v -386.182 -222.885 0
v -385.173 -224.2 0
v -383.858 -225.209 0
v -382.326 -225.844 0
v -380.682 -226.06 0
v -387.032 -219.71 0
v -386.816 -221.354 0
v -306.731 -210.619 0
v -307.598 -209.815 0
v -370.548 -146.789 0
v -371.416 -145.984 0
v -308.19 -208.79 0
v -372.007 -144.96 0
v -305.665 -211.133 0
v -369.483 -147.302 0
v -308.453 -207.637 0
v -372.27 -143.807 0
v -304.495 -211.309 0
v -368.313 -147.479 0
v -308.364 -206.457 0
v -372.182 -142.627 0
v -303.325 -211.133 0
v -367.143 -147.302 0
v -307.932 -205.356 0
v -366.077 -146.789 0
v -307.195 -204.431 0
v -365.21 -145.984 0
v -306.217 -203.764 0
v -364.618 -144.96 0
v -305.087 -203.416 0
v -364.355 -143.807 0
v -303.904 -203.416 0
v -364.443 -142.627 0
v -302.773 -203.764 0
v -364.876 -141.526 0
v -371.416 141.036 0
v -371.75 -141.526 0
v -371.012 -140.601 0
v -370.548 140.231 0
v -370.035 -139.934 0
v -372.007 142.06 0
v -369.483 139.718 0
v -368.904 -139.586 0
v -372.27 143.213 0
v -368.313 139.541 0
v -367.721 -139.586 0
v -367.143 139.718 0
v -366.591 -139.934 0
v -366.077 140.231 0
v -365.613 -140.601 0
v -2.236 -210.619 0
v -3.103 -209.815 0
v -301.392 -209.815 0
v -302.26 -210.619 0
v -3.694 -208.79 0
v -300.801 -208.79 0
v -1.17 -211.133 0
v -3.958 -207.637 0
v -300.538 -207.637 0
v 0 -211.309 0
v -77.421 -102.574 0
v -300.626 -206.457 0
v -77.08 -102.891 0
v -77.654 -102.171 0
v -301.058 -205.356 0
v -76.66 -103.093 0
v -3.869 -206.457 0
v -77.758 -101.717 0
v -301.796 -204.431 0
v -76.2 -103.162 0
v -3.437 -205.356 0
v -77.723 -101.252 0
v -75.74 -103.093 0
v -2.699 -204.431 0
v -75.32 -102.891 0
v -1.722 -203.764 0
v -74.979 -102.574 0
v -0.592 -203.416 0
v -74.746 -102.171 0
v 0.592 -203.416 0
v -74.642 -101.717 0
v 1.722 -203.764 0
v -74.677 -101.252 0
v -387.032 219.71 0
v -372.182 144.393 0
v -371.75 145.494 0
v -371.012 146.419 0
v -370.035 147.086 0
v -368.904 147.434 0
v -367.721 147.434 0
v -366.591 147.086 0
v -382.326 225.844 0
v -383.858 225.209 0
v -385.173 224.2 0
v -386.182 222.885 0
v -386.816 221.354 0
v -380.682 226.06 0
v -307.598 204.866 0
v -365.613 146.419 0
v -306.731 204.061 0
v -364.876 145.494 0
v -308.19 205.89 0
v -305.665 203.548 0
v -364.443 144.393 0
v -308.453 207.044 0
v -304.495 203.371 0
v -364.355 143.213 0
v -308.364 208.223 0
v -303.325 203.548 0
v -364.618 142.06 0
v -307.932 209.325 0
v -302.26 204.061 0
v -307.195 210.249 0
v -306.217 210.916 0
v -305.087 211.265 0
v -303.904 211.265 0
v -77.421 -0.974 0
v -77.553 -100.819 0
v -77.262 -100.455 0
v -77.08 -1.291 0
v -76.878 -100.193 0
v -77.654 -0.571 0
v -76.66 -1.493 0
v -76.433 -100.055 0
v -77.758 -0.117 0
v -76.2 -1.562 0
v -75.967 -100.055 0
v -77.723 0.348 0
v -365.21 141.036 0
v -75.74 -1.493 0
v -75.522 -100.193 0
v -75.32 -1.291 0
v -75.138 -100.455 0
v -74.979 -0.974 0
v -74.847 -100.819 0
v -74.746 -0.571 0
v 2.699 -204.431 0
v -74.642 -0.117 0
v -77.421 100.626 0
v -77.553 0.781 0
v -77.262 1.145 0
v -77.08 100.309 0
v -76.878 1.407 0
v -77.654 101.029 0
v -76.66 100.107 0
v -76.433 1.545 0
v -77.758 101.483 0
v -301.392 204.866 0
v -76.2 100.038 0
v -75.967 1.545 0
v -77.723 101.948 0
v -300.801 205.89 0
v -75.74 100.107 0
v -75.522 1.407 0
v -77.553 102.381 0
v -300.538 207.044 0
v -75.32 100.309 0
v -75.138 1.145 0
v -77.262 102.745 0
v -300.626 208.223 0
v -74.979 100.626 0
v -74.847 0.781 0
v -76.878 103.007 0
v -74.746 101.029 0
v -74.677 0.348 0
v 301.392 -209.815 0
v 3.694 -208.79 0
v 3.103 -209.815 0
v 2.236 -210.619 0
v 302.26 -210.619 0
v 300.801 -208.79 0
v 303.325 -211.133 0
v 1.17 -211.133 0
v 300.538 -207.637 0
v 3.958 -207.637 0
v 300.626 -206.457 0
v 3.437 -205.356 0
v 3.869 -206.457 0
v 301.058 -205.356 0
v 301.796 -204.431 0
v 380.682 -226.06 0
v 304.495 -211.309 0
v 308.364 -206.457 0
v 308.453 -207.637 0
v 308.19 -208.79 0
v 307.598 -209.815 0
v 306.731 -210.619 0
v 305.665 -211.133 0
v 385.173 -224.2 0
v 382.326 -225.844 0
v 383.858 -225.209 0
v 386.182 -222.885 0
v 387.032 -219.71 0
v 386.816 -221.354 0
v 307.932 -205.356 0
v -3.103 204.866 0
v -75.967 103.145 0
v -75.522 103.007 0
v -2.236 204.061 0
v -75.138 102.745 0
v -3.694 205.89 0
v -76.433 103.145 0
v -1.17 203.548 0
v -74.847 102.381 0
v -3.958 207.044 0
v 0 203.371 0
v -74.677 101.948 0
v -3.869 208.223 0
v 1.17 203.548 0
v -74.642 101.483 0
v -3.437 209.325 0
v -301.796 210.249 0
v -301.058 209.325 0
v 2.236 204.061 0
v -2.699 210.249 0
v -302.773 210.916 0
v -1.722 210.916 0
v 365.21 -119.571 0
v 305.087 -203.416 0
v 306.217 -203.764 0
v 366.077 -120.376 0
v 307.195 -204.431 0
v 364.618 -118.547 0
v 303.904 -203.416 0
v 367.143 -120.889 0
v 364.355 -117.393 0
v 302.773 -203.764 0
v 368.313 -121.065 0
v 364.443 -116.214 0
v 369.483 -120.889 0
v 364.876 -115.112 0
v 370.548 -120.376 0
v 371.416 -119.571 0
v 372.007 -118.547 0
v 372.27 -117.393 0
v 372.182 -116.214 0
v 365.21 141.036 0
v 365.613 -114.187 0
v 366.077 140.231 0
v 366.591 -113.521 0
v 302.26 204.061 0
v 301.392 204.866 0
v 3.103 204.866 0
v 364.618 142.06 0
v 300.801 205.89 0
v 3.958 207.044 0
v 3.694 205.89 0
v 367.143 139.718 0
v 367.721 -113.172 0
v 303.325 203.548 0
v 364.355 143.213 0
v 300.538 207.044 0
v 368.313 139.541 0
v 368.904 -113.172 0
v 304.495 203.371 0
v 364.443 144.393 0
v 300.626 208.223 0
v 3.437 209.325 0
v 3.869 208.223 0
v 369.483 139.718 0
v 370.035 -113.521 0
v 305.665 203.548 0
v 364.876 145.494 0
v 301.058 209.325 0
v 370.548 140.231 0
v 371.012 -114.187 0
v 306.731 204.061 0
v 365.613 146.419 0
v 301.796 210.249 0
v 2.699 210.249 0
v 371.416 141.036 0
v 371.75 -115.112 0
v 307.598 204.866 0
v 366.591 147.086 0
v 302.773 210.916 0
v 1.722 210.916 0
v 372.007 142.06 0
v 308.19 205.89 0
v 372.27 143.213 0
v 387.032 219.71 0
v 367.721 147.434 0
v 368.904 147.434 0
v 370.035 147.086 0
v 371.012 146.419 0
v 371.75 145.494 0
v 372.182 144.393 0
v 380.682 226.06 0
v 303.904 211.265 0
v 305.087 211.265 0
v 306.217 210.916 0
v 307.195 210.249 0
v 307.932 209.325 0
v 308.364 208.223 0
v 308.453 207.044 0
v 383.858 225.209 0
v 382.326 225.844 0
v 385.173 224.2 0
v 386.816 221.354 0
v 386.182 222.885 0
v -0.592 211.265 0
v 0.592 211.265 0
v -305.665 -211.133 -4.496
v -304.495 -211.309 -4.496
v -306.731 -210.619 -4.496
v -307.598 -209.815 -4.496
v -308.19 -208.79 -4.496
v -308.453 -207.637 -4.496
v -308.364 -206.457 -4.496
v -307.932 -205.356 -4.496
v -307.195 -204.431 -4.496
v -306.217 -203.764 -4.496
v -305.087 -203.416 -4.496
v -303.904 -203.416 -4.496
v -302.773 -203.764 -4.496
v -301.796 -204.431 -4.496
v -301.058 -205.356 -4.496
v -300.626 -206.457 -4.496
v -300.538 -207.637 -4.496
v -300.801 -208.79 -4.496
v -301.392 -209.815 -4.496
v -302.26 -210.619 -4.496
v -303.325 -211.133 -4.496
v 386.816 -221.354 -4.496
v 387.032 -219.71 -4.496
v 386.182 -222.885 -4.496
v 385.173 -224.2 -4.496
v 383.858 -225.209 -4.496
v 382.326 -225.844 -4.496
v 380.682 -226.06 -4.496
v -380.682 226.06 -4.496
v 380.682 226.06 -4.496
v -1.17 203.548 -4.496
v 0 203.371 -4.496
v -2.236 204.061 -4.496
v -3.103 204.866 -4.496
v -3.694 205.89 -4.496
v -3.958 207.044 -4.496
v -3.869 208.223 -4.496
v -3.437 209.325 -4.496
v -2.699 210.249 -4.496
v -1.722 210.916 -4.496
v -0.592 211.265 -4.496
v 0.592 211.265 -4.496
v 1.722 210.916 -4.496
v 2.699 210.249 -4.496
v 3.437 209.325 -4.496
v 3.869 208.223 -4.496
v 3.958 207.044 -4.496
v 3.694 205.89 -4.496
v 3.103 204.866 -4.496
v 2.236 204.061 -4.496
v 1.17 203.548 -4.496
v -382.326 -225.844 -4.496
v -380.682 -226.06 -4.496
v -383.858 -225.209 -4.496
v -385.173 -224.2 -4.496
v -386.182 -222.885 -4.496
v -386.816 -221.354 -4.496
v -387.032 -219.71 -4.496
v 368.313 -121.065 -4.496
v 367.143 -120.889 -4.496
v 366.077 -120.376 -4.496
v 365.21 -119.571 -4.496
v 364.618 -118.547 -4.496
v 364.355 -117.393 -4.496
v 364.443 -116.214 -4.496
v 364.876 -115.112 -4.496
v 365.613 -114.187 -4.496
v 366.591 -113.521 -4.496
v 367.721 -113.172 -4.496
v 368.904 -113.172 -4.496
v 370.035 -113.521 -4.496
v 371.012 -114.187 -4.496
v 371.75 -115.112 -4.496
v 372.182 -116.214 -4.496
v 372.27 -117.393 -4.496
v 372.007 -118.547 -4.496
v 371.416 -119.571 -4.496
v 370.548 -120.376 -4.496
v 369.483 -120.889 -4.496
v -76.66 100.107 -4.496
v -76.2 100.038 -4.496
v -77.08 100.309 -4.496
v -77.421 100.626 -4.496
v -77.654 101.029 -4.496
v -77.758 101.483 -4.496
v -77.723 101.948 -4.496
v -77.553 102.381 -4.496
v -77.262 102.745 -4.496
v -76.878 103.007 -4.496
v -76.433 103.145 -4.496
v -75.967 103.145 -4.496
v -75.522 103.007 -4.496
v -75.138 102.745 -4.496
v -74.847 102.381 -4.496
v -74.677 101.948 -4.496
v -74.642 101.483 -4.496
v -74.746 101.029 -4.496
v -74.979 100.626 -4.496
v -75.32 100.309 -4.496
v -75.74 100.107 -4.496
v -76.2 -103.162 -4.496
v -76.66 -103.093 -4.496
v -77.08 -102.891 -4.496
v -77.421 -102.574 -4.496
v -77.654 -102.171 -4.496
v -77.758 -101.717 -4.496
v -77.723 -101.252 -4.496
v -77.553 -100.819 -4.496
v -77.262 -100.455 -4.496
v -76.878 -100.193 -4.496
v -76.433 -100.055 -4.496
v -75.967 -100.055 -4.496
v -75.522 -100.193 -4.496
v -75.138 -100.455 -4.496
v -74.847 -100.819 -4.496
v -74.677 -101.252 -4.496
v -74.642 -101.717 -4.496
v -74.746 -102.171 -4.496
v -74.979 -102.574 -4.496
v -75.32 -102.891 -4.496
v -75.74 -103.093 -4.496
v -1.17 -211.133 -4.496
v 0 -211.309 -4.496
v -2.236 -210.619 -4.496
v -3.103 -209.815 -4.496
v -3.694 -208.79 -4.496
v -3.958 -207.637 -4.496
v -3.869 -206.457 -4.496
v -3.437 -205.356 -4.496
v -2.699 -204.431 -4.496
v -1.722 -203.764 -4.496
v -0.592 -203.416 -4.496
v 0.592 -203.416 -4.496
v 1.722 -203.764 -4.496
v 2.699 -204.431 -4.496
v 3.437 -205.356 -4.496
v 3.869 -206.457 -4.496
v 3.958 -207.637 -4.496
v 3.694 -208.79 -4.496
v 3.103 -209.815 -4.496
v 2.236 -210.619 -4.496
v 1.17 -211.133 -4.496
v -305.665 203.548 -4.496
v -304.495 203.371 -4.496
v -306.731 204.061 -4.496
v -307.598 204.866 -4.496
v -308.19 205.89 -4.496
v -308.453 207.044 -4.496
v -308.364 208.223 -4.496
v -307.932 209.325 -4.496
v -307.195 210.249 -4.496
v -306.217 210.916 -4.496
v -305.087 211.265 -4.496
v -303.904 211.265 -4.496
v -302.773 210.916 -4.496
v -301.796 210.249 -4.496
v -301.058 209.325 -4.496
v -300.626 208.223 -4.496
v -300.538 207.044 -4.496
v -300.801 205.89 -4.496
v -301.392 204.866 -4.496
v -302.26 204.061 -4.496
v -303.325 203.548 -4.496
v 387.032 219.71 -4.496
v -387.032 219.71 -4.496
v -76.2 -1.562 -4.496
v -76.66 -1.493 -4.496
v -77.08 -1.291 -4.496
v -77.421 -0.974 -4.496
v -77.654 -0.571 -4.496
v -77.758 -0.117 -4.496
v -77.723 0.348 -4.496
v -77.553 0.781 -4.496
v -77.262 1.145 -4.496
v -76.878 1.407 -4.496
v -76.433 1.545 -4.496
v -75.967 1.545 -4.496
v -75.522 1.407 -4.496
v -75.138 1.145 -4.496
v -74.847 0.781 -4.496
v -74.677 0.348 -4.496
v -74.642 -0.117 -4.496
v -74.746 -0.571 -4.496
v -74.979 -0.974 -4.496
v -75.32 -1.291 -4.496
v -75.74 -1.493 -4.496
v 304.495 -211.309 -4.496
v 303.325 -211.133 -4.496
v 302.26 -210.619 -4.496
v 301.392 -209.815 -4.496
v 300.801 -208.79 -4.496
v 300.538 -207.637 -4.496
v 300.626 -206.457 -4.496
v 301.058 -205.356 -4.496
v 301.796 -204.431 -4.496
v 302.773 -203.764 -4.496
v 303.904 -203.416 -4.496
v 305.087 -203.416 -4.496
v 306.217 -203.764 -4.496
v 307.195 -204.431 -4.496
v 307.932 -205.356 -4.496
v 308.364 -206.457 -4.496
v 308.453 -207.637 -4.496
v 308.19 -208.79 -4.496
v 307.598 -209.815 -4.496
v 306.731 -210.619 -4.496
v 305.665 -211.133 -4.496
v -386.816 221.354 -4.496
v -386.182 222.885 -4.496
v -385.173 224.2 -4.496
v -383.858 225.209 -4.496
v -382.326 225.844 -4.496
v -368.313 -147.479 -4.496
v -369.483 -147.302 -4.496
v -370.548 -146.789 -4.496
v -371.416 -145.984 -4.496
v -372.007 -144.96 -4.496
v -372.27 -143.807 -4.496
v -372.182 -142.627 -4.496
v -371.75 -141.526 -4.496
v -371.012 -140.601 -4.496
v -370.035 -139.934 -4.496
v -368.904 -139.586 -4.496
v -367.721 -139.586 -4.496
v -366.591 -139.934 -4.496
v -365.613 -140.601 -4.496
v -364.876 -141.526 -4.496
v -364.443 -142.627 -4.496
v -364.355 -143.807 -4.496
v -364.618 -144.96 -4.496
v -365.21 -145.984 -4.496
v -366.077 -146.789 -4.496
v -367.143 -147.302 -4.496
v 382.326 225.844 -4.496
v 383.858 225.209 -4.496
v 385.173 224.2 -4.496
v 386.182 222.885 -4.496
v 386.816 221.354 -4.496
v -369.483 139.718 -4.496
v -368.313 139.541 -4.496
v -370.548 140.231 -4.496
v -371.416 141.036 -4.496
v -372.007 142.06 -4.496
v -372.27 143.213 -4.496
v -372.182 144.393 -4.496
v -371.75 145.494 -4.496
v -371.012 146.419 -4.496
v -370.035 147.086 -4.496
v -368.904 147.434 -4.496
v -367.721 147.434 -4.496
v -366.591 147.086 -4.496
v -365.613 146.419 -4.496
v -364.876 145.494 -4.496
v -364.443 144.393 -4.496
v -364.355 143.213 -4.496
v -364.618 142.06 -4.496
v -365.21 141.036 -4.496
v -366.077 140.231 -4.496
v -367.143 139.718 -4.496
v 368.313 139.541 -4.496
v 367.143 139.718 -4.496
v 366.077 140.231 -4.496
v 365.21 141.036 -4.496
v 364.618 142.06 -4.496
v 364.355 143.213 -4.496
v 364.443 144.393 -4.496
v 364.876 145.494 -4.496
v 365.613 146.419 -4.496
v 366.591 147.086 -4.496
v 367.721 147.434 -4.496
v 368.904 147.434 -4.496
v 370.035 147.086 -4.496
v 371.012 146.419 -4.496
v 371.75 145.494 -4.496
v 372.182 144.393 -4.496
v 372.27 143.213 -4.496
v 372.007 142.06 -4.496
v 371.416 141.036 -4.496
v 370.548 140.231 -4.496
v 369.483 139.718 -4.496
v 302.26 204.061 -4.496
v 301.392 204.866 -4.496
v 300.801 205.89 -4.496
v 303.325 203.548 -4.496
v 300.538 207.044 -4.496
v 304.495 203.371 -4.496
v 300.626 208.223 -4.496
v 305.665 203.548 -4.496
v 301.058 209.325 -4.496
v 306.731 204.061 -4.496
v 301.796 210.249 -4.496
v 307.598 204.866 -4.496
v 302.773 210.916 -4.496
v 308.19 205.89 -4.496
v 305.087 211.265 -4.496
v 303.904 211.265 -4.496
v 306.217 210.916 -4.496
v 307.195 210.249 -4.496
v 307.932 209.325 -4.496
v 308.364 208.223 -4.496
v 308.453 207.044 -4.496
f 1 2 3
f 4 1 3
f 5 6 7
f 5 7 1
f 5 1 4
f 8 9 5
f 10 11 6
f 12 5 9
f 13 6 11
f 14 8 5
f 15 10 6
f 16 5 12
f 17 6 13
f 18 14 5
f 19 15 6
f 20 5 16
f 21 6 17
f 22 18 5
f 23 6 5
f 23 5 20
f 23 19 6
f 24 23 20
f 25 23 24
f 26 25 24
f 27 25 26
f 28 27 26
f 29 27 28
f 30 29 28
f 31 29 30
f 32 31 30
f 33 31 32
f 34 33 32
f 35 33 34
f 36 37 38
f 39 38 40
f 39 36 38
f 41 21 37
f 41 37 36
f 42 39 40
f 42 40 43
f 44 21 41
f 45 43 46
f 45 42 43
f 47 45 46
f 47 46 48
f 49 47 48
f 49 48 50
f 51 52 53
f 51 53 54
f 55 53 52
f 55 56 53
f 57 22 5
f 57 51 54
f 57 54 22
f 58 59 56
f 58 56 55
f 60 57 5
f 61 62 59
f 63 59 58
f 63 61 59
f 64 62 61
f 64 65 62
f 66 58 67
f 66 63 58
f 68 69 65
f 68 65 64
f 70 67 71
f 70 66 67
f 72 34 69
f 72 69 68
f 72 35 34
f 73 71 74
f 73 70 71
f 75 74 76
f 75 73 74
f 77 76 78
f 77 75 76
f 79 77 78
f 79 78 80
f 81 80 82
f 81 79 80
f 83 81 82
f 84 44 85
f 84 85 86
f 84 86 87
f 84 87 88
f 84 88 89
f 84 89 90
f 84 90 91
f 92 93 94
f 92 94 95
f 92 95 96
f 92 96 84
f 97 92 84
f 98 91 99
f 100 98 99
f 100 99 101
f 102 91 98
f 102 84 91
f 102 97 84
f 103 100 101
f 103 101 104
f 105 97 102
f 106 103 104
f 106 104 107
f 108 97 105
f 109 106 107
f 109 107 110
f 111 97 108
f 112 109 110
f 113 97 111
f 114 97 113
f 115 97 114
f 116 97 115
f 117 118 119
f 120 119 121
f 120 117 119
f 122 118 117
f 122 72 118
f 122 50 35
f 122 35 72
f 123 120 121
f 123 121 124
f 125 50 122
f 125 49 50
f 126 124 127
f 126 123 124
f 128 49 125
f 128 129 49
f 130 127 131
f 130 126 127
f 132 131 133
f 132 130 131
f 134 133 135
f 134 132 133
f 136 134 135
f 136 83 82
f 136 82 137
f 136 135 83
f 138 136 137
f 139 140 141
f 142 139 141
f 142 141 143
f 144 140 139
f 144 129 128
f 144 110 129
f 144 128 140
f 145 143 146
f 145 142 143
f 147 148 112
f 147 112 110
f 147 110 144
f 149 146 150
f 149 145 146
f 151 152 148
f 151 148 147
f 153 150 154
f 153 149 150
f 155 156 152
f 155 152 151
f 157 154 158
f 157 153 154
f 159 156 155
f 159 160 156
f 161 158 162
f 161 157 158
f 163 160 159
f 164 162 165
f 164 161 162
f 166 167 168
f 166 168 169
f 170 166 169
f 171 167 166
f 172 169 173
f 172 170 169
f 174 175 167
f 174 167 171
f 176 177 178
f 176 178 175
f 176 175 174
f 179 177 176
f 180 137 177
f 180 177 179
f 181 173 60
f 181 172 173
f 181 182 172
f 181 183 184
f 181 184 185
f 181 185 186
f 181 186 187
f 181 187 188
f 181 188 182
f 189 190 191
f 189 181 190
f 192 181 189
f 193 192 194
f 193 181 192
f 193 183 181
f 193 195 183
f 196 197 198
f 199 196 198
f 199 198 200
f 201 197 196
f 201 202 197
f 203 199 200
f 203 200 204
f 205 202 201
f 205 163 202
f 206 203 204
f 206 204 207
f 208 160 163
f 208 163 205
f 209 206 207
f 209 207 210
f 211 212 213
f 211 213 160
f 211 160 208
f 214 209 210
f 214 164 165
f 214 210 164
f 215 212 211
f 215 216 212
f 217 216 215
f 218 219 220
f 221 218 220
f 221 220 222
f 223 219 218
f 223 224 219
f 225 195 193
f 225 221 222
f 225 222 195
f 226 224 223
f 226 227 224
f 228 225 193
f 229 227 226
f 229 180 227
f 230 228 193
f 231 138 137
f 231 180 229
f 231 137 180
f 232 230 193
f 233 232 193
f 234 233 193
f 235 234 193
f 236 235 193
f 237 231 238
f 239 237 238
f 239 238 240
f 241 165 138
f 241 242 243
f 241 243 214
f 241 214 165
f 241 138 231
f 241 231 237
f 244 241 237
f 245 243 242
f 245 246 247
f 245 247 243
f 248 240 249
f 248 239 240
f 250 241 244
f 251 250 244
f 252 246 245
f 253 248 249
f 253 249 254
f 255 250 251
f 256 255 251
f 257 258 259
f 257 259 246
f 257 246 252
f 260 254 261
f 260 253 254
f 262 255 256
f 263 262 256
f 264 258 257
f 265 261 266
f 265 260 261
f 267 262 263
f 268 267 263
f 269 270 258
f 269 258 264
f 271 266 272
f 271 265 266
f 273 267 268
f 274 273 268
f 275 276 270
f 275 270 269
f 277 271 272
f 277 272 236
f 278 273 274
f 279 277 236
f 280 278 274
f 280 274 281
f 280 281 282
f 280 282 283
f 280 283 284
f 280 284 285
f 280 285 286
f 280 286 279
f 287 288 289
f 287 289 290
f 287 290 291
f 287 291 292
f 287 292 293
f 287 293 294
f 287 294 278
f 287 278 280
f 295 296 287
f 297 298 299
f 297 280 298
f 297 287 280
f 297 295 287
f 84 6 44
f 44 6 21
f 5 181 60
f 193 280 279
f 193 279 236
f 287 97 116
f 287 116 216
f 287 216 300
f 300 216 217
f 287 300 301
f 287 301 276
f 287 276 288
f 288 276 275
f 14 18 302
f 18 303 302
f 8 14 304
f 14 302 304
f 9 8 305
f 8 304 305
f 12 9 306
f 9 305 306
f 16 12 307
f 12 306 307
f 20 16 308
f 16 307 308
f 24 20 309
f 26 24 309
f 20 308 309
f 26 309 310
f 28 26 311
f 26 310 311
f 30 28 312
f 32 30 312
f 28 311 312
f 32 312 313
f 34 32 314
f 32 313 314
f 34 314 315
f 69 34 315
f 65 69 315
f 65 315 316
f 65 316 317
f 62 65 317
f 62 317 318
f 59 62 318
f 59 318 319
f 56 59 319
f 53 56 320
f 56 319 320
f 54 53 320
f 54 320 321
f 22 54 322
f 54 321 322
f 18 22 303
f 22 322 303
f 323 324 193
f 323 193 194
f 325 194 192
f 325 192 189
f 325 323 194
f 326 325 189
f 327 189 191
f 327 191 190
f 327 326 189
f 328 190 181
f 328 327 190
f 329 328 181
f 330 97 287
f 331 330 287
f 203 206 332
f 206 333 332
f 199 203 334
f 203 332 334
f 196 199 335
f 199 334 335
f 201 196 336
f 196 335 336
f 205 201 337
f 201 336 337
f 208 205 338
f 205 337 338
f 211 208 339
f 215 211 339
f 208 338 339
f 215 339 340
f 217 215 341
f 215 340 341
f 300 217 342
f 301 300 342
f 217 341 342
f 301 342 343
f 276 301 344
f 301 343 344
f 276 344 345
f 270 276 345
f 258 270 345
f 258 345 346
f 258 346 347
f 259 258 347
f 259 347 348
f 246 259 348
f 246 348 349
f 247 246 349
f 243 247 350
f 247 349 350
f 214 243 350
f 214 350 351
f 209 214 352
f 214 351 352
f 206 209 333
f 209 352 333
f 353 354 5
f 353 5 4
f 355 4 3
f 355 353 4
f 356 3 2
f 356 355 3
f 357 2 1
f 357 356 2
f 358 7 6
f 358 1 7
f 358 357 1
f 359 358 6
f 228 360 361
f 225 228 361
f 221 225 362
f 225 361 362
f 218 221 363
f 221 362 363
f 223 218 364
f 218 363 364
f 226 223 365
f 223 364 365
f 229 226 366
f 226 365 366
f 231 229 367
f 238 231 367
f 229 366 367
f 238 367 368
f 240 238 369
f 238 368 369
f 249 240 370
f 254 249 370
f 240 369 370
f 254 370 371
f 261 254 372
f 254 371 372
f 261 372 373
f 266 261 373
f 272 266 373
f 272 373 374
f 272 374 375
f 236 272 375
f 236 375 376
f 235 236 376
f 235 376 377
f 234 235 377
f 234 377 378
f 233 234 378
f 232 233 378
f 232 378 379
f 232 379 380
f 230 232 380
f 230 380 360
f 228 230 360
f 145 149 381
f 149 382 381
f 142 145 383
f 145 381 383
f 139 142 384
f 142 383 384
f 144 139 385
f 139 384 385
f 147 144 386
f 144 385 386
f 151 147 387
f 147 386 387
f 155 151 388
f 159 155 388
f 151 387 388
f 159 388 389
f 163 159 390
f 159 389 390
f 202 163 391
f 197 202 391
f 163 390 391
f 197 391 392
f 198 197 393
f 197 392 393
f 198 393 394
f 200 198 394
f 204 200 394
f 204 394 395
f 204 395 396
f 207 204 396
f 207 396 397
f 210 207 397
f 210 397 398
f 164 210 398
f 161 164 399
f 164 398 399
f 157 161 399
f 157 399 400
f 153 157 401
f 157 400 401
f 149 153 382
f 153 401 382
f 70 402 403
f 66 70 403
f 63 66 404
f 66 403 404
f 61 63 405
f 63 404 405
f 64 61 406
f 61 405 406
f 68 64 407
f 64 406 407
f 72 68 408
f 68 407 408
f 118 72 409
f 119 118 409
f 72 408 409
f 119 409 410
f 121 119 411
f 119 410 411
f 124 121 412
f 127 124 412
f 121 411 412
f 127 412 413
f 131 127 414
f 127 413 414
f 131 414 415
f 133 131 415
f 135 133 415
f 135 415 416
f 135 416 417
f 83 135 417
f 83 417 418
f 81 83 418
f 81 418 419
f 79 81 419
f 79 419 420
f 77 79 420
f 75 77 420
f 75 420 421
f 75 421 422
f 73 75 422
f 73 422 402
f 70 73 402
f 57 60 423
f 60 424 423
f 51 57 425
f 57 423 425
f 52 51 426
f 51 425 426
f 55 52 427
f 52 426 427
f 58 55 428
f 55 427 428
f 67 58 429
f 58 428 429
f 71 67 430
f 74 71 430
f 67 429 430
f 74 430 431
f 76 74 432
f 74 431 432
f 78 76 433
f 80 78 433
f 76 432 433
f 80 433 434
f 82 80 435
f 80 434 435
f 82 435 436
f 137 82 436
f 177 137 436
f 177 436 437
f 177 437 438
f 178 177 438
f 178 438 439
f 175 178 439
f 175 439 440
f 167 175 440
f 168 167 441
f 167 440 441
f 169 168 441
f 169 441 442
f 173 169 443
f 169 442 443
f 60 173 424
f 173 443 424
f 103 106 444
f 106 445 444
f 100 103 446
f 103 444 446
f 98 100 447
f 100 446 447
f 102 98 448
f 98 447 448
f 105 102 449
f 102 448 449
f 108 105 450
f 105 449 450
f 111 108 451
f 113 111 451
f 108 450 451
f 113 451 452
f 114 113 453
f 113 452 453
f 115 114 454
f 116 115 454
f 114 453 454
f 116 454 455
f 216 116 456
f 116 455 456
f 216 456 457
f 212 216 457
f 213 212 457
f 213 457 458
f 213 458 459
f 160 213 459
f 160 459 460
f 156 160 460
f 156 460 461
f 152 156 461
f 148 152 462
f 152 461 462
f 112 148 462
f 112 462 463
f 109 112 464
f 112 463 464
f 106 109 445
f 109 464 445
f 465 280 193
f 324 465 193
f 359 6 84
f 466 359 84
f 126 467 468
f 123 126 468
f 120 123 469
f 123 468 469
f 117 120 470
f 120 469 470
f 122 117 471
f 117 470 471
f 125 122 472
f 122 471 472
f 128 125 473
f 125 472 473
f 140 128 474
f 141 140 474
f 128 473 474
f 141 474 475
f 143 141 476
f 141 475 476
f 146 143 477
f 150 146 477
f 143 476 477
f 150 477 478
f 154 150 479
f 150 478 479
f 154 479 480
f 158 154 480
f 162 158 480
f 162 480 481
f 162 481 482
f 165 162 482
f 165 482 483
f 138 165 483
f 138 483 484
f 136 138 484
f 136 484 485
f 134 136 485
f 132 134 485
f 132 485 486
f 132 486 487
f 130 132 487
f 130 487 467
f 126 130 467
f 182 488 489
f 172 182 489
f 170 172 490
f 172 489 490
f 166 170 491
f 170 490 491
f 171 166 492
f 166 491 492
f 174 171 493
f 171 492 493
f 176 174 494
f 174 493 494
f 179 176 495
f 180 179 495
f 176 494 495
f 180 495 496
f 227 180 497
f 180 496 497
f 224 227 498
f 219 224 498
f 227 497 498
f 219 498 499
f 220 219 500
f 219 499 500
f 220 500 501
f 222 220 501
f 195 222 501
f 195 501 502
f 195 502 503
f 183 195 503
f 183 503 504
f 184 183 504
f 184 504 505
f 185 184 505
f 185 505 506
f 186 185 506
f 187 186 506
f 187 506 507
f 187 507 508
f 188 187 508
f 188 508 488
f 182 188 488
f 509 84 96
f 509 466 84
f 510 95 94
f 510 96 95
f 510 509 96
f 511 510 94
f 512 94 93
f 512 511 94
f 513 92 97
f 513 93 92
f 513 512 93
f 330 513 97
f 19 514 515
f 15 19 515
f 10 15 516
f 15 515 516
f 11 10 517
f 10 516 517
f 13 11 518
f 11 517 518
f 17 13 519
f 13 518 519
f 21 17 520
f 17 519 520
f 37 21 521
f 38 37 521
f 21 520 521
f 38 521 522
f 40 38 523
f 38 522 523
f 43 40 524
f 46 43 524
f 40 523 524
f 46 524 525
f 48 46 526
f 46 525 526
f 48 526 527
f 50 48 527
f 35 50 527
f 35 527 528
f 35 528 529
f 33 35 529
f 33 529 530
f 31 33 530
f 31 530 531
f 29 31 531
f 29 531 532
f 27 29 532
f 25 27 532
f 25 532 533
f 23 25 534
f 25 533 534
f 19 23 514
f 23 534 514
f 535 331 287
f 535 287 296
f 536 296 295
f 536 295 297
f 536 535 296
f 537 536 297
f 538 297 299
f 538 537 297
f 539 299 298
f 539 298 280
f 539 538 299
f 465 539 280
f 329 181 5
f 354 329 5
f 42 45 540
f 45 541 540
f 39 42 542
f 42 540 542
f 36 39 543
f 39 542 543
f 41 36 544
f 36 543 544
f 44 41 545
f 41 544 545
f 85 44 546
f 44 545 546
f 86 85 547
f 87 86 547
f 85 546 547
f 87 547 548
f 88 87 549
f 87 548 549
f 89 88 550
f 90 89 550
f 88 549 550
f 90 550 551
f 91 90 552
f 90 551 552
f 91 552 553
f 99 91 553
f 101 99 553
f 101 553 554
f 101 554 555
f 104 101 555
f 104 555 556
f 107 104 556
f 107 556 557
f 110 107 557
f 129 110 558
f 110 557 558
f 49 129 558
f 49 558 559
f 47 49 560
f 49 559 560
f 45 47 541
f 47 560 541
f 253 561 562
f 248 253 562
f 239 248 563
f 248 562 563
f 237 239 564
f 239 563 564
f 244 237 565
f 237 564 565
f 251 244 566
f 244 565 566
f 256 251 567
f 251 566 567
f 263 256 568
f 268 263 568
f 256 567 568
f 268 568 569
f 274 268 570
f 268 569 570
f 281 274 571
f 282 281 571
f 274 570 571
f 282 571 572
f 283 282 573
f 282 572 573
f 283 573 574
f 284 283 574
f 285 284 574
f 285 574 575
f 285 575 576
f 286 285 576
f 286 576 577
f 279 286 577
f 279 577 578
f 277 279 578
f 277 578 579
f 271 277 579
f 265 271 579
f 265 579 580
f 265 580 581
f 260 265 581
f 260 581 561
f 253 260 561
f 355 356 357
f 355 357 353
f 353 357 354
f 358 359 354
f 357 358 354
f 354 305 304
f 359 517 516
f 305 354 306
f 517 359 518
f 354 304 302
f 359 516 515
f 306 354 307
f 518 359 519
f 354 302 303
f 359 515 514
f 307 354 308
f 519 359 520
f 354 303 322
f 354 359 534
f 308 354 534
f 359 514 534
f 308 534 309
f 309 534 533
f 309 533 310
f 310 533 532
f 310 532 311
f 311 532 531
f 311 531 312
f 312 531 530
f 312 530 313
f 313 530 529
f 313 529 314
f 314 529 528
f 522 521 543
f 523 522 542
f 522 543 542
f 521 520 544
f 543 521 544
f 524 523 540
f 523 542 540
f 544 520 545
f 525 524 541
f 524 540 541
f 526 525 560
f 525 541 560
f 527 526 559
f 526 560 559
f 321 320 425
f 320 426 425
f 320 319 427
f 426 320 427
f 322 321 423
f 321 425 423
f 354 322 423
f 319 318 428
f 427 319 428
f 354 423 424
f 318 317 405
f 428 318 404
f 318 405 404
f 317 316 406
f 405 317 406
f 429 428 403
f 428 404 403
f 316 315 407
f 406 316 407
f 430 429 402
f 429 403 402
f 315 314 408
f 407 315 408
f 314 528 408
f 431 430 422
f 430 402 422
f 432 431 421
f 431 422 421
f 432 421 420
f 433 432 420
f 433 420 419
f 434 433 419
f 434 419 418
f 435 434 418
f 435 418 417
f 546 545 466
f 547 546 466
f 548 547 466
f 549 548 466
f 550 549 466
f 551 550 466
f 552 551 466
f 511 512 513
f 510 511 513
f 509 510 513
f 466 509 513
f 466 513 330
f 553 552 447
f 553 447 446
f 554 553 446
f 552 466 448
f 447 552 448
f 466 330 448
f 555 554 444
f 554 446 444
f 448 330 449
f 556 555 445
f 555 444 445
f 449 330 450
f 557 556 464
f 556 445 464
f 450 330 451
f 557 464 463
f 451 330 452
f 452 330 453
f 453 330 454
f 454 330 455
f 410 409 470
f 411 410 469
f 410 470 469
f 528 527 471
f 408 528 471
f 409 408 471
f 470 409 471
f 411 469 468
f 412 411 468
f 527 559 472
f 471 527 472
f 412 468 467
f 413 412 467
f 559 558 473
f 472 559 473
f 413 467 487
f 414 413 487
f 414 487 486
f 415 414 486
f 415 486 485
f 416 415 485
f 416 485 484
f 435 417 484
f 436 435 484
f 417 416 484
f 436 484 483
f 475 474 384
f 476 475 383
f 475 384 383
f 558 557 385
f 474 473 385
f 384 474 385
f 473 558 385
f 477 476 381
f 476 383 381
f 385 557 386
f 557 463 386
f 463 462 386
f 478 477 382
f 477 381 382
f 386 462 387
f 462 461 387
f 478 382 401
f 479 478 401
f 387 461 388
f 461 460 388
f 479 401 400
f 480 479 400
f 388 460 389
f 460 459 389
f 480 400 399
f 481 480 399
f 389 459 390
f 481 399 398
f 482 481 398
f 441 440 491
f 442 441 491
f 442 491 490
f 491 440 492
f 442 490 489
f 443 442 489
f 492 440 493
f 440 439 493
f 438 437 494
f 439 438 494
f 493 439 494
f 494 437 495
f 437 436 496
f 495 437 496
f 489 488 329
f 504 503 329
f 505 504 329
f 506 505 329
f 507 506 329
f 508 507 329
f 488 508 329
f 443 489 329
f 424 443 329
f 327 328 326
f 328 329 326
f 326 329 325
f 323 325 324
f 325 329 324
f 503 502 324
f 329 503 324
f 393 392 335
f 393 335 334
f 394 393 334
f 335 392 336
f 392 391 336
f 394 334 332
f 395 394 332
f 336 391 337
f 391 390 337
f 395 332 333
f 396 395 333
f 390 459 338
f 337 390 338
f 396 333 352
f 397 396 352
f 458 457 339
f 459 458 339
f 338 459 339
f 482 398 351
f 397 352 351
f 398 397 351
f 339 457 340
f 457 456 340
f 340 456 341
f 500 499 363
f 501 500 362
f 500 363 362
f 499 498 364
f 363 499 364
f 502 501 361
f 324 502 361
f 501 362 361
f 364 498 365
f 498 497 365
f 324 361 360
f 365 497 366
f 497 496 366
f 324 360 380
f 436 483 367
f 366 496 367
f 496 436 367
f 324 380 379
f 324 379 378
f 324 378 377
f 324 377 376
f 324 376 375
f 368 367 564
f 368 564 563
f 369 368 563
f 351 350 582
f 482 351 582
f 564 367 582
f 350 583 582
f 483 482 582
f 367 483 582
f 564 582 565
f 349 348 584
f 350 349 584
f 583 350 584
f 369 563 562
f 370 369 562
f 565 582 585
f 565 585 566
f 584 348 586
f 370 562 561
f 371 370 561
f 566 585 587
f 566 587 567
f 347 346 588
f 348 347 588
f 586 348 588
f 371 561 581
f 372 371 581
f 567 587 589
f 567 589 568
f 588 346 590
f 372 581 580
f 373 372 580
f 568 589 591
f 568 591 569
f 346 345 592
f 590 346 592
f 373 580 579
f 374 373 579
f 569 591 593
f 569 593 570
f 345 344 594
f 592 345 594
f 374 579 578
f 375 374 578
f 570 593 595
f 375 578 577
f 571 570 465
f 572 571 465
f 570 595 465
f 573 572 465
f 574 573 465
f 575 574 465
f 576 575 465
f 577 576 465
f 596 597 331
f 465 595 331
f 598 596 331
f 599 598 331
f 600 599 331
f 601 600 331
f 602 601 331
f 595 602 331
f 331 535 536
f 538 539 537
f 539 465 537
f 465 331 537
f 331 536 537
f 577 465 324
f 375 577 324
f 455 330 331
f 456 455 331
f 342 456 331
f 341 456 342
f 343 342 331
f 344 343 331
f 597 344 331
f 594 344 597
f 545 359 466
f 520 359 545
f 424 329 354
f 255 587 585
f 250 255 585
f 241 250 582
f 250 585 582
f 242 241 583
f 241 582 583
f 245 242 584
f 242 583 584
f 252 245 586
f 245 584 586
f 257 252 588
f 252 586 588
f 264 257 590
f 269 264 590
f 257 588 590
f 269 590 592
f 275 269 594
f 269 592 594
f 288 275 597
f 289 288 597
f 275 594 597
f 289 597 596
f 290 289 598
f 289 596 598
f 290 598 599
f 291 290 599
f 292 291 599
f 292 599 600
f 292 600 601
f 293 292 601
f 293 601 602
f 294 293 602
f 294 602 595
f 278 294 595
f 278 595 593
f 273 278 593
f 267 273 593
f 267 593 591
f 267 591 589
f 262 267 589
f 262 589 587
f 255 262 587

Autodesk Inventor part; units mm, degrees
ref_plane "YZ Plane" through (0, 0, 0) normal (1, 0, 0) x (0, 1, 0)
ref_plane "XZ Plane" through (0, 0, 0) normal (0, 1, 0) x (-1, 0, 0)
ref_plane "XY Plane" through (0, 0, 0) normal (0, 0, 1) x (1, 0, 0)
sketch "Sketch1" plane through (0, 0, 0) normal (0, 0, 1) x (1, 0, 0)
  line L0 (0, 316.484) -> (0, -316.484) projected
  line L1 (-541.8455, 0) -> (541.8455, 0) projected
  line L2 (387.0325, -226.06) -> (-387.0325, -226.06)
  line L3 (-387.0325, -226.06) -> (-387.0325, 226.06)
  line L4 (-387.0325, 226.06) -> (387.0325, 226.06)
  line L5 (387.0325, 226.06) -> (387.0325, -226.06)
  line L6 (387.0325, -226.06) -> (-387.0325, 226.06) construction
  line L7 (-387.0325, -226.06) -> (387.0325, 226.06) construction
  line L8 (368.3127, -207.3402) -> (-368.3127, -207.3402) construction
  line L9 (-368.3127, -207.3402) -> (-368.3127, 207.3402) construction
  line L10 (-368.3127, 207.3402) -> (368.3127, 207.3402) construction
  line L11 (368.3127, 207.3402) -> (368.3127, -207.3402) construction
  line L12 (368.3127, -207.3402) -> (-368.3127, 207.3402) construction
  line L13 (-368.3127, -207.3402) -> (368.3127, 207.3402) construction
  point P0 (0, 0)
  point P1 (-304.4952, 207.3402)
  point P2 (0, 207.3402)
  point P3 (304.4952, 207.3402)
  point P4 (-304.4952, -207.3402)
  point P5 (0, -207.3402)
  point P6 (304.4952, -207.3402)
  point P7 (-368.3127, 143.51)
  point P8 (-368.3127, -143.51)
  point P9 (368.3127, 143.51)
  point P10 (368.3127, -117.0967)
  dimension "d0" = 774.065
  dimension "d1" = 452.12
  dimension "d3" = 18.7198
  dimension "d4" = 18.7198
  dimension "d5" = 304.4952
  dimension "d6" = 304.4952
  dimension "d7" = 143.51
  dimension "d8" = 143.51
  dimension "d9" = 82.5373
  dimension "d10" = 82.55
extrude "Extrusion1" add sketch "Sketch1" against normal blind 4.4958
hole "Hole1" at (-304.4952, 207.3402, 0) at (0, 207.3402, 0) at (304.4952, 207.3402, 0) at (-304.4952, -207.3402, 0) at (0, -207.3402, 0) at (304.4952, -207.3402, 0) at (-368.3127, 143.51, 0) at (-368.3127, -143.51, 0) at (368.3127, 143.51, 0) at (368.3127, -117.0967, 0) direction (0, 0, -1) diameter 7.9375 end through all
fillet "Fillet1" radius 6.35 4 edges at (387.0325, 226.06, -2.2479) (387.0325, -226.06, -2.2479) (-387.0325, -226.06, -2.2479) (-387.0325, 226.06, -2.2479)
sketch "Sketch2" plane through (0, 0, 0) normal (0, 0, 1) x (1, 0, 0)
  line L0 (0, 316.484) -> (0, -316.484) projected
  line L1 (-541.8455, 0) -> (541.8455, 0) projected
  point P0 (0, 0)
  point P1 (-76.2, 101.6)
  point P2 (-76.2, 0)
  point P3 (-76.2, -101.6)
  dimension "d21" = 76.2
  dimension "d22" = 101.6
  dimension "d24" = 0
  dimension "d25" = 101.6
hole "Hole2" at (-76.2, 101.6, 0) at (-76.2, 0, 0) at (-76.2, -101.6, 0) direction (0, 0, -1) diameter 3.1242 end through all
properties material "ACRYLIC, CLEAR"
